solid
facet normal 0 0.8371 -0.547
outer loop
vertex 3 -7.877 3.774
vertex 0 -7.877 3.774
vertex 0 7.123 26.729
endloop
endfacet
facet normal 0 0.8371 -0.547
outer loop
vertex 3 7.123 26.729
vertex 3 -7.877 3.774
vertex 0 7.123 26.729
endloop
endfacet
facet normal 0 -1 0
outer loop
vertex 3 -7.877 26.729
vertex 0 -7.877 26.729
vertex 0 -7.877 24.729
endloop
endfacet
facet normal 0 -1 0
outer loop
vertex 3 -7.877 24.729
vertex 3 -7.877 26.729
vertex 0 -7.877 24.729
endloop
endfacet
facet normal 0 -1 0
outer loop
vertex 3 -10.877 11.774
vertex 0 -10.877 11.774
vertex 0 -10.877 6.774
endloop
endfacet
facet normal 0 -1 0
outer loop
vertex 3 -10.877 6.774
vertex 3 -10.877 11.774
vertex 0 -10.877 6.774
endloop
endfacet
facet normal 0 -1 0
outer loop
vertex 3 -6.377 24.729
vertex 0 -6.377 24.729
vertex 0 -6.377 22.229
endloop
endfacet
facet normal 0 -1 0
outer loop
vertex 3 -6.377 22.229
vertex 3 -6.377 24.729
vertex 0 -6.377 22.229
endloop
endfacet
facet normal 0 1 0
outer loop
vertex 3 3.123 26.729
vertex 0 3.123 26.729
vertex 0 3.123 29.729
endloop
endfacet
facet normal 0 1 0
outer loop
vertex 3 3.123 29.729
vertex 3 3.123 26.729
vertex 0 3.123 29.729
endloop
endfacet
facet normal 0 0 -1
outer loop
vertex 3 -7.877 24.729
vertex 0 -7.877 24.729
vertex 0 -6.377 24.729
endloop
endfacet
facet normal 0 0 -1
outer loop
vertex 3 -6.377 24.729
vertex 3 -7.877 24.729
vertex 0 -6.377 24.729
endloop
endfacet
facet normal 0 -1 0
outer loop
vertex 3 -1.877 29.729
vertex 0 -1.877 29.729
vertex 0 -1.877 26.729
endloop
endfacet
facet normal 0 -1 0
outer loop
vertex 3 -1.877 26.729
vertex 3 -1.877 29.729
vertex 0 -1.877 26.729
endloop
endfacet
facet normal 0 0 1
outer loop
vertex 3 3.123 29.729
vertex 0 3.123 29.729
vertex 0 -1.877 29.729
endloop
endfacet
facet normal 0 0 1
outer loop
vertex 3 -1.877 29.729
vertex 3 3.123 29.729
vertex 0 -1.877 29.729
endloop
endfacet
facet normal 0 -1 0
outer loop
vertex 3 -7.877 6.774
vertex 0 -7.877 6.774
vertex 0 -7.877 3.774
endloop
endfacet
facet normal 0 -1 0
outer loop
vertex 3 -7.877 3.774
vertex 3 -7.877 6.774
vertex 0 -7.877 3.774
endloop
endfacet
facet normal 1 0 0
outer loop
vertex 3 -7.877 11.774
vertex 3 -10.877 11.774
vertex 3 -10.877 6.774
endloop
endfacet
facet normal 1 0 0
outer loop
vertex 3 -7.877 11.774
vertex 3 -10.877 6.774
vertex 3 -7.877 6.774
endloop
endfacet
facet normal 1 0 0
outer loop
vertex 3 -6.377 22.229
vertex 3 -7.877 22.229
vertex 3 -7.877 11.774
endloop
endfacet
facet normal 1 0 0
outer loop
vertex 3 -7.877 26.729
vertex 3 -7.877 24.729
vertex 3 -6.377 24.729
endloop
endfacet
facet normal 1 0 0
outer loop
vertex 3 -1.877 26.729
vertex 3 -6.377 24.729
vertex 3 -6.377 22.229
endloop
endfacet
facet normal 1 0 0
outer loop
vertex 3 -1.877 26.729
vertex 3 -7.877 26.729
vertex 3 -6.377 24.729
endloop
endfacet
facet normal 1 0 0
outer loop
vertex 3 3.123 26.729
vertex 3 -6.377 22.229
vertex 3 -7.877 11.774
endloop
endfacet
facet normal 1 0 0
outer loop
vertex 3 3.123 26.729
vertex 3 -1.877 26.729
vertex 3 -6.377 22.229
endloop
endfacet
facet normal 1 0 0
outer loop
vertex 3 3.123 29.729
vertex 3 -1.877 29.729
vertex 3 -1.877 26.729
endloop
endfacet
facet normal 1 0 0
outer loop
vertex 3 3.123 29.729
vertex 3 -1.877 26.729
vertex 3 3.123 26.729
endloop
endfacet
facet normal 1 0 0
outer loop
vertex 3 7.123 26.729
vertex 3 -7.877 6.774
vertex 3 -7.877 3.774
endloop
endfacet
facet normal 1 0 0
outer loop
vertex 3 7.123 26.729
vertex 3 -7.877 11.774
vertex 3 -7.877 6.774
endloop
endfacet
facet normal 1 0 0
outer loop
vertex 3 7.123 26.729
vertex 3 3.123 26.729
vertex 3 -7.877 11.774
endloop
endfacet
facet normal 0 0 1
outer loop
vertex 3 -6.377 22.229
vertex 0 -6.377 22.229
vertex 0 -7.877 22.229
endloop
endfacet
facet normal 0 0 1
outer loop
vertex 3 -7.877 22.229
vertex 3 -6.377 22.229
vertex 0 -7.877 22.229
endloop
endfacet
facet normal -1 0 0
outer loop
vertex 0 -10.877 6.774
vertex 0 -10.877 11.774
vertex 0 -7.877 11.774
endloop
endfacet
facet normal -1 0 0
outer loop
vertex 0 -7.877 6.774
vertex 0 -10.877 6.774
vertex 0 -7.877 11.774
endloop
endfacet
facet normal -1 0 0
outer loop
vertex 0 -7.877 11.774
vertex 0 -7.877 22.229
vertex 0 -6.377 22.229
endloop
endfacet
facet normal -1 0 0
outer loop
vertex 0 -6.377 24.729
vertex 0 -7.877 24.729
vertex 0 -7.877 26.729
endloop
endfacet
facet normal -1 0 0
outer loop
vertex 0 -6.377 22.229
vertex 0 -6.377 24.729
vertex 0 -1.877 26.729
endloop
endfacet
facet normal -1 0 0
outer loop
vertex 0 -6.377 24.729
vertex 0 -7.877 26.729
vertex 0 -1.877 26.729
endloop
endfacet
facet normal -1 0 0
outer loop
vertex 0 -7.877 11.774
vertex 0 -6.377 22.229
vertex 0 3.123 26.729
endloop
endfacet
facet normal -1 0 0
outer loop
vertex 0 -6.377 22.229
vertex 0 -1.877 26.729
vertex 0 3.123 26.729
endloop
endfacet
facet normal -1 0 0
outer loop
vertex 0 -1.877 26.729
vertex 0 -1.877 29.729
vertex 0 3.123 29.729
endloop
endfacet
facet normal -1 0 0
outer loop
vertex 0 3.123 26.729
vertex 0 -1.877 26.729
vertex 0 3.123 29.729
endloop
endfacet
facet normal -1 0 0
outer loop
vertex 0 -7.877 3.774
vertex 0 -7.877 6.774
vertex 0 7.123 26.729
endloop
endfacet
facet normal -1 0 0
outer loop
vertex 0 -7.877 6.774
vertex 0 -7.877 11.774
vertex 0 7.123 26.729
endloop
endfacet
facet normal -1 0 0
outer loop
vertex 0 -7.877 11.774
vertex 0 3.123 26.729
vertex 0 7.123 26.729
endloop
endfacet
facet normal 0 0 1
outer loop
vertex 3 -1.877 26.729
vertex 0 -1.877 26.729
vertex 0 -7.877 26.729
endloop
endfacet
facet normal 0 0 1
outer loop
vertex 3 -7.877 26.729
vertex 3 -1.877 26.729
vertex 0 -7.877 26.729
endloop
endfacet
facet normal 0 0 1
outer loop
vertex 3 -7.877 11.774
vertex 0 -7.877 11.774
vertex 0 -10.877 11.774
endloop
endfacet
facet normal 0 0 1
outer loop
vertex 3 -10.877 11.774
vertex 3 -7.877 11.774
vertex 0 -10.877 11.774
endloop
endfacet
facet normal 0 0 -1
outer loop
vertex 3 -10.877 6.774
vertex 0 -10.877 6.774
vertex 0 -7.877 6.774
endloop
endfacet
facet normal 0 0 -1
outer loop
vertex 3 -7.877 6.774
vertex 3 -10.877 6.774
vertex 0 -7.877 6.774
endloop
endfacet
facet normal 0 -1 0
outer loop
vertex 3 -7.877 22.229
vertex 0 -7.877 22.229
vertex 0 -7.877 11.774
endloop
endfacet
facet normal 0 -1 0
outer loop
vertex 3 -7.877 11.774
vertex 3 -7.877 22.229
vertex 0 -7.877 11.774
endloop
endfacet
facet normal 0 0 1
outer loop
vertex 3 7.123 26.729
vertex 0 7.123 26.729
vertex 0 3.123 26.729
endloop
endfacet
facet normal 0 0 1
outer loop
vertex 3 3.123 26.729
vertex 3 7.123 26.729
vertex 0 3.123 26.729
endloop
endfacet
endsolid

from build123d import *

# Parameters (mm, degrees)
F1_DEPTH = 3


# Not quite as in the source:
# - a feature names something its author has since deleted; it is built from what else it names


with BuildPart() as f1:
    # F0 (on Right) → F1 (new body)
    with BuildSketch(Plane.YZ):
        Polygon((-1.8767494946, 26.7287779992), (-7.8767494946, 26.7287779992), (-7.8767494946, 24.7287779992), (-6.3767494946, 24.7287779992), (-6.3767494946, 22.2287779992), (-7.8767494946, 22.2287779992), (-7.8767494946, 11.7737779992), (-10.8767494946, 11.7737779992), (-10.8767494946, 6.7737779992), (-7.8767494946, 6.7737779992), (-7.8767494946, 3.7737779992), (7.1232505054, 26.7287779992), (3.1232505054, 26.7287779992), (3.1232505054, 29.7287779992), (-1.8767494946, 29.7287779992), align=None)
    extrude(amount=F1_DEPTH)


solid = f1.part
